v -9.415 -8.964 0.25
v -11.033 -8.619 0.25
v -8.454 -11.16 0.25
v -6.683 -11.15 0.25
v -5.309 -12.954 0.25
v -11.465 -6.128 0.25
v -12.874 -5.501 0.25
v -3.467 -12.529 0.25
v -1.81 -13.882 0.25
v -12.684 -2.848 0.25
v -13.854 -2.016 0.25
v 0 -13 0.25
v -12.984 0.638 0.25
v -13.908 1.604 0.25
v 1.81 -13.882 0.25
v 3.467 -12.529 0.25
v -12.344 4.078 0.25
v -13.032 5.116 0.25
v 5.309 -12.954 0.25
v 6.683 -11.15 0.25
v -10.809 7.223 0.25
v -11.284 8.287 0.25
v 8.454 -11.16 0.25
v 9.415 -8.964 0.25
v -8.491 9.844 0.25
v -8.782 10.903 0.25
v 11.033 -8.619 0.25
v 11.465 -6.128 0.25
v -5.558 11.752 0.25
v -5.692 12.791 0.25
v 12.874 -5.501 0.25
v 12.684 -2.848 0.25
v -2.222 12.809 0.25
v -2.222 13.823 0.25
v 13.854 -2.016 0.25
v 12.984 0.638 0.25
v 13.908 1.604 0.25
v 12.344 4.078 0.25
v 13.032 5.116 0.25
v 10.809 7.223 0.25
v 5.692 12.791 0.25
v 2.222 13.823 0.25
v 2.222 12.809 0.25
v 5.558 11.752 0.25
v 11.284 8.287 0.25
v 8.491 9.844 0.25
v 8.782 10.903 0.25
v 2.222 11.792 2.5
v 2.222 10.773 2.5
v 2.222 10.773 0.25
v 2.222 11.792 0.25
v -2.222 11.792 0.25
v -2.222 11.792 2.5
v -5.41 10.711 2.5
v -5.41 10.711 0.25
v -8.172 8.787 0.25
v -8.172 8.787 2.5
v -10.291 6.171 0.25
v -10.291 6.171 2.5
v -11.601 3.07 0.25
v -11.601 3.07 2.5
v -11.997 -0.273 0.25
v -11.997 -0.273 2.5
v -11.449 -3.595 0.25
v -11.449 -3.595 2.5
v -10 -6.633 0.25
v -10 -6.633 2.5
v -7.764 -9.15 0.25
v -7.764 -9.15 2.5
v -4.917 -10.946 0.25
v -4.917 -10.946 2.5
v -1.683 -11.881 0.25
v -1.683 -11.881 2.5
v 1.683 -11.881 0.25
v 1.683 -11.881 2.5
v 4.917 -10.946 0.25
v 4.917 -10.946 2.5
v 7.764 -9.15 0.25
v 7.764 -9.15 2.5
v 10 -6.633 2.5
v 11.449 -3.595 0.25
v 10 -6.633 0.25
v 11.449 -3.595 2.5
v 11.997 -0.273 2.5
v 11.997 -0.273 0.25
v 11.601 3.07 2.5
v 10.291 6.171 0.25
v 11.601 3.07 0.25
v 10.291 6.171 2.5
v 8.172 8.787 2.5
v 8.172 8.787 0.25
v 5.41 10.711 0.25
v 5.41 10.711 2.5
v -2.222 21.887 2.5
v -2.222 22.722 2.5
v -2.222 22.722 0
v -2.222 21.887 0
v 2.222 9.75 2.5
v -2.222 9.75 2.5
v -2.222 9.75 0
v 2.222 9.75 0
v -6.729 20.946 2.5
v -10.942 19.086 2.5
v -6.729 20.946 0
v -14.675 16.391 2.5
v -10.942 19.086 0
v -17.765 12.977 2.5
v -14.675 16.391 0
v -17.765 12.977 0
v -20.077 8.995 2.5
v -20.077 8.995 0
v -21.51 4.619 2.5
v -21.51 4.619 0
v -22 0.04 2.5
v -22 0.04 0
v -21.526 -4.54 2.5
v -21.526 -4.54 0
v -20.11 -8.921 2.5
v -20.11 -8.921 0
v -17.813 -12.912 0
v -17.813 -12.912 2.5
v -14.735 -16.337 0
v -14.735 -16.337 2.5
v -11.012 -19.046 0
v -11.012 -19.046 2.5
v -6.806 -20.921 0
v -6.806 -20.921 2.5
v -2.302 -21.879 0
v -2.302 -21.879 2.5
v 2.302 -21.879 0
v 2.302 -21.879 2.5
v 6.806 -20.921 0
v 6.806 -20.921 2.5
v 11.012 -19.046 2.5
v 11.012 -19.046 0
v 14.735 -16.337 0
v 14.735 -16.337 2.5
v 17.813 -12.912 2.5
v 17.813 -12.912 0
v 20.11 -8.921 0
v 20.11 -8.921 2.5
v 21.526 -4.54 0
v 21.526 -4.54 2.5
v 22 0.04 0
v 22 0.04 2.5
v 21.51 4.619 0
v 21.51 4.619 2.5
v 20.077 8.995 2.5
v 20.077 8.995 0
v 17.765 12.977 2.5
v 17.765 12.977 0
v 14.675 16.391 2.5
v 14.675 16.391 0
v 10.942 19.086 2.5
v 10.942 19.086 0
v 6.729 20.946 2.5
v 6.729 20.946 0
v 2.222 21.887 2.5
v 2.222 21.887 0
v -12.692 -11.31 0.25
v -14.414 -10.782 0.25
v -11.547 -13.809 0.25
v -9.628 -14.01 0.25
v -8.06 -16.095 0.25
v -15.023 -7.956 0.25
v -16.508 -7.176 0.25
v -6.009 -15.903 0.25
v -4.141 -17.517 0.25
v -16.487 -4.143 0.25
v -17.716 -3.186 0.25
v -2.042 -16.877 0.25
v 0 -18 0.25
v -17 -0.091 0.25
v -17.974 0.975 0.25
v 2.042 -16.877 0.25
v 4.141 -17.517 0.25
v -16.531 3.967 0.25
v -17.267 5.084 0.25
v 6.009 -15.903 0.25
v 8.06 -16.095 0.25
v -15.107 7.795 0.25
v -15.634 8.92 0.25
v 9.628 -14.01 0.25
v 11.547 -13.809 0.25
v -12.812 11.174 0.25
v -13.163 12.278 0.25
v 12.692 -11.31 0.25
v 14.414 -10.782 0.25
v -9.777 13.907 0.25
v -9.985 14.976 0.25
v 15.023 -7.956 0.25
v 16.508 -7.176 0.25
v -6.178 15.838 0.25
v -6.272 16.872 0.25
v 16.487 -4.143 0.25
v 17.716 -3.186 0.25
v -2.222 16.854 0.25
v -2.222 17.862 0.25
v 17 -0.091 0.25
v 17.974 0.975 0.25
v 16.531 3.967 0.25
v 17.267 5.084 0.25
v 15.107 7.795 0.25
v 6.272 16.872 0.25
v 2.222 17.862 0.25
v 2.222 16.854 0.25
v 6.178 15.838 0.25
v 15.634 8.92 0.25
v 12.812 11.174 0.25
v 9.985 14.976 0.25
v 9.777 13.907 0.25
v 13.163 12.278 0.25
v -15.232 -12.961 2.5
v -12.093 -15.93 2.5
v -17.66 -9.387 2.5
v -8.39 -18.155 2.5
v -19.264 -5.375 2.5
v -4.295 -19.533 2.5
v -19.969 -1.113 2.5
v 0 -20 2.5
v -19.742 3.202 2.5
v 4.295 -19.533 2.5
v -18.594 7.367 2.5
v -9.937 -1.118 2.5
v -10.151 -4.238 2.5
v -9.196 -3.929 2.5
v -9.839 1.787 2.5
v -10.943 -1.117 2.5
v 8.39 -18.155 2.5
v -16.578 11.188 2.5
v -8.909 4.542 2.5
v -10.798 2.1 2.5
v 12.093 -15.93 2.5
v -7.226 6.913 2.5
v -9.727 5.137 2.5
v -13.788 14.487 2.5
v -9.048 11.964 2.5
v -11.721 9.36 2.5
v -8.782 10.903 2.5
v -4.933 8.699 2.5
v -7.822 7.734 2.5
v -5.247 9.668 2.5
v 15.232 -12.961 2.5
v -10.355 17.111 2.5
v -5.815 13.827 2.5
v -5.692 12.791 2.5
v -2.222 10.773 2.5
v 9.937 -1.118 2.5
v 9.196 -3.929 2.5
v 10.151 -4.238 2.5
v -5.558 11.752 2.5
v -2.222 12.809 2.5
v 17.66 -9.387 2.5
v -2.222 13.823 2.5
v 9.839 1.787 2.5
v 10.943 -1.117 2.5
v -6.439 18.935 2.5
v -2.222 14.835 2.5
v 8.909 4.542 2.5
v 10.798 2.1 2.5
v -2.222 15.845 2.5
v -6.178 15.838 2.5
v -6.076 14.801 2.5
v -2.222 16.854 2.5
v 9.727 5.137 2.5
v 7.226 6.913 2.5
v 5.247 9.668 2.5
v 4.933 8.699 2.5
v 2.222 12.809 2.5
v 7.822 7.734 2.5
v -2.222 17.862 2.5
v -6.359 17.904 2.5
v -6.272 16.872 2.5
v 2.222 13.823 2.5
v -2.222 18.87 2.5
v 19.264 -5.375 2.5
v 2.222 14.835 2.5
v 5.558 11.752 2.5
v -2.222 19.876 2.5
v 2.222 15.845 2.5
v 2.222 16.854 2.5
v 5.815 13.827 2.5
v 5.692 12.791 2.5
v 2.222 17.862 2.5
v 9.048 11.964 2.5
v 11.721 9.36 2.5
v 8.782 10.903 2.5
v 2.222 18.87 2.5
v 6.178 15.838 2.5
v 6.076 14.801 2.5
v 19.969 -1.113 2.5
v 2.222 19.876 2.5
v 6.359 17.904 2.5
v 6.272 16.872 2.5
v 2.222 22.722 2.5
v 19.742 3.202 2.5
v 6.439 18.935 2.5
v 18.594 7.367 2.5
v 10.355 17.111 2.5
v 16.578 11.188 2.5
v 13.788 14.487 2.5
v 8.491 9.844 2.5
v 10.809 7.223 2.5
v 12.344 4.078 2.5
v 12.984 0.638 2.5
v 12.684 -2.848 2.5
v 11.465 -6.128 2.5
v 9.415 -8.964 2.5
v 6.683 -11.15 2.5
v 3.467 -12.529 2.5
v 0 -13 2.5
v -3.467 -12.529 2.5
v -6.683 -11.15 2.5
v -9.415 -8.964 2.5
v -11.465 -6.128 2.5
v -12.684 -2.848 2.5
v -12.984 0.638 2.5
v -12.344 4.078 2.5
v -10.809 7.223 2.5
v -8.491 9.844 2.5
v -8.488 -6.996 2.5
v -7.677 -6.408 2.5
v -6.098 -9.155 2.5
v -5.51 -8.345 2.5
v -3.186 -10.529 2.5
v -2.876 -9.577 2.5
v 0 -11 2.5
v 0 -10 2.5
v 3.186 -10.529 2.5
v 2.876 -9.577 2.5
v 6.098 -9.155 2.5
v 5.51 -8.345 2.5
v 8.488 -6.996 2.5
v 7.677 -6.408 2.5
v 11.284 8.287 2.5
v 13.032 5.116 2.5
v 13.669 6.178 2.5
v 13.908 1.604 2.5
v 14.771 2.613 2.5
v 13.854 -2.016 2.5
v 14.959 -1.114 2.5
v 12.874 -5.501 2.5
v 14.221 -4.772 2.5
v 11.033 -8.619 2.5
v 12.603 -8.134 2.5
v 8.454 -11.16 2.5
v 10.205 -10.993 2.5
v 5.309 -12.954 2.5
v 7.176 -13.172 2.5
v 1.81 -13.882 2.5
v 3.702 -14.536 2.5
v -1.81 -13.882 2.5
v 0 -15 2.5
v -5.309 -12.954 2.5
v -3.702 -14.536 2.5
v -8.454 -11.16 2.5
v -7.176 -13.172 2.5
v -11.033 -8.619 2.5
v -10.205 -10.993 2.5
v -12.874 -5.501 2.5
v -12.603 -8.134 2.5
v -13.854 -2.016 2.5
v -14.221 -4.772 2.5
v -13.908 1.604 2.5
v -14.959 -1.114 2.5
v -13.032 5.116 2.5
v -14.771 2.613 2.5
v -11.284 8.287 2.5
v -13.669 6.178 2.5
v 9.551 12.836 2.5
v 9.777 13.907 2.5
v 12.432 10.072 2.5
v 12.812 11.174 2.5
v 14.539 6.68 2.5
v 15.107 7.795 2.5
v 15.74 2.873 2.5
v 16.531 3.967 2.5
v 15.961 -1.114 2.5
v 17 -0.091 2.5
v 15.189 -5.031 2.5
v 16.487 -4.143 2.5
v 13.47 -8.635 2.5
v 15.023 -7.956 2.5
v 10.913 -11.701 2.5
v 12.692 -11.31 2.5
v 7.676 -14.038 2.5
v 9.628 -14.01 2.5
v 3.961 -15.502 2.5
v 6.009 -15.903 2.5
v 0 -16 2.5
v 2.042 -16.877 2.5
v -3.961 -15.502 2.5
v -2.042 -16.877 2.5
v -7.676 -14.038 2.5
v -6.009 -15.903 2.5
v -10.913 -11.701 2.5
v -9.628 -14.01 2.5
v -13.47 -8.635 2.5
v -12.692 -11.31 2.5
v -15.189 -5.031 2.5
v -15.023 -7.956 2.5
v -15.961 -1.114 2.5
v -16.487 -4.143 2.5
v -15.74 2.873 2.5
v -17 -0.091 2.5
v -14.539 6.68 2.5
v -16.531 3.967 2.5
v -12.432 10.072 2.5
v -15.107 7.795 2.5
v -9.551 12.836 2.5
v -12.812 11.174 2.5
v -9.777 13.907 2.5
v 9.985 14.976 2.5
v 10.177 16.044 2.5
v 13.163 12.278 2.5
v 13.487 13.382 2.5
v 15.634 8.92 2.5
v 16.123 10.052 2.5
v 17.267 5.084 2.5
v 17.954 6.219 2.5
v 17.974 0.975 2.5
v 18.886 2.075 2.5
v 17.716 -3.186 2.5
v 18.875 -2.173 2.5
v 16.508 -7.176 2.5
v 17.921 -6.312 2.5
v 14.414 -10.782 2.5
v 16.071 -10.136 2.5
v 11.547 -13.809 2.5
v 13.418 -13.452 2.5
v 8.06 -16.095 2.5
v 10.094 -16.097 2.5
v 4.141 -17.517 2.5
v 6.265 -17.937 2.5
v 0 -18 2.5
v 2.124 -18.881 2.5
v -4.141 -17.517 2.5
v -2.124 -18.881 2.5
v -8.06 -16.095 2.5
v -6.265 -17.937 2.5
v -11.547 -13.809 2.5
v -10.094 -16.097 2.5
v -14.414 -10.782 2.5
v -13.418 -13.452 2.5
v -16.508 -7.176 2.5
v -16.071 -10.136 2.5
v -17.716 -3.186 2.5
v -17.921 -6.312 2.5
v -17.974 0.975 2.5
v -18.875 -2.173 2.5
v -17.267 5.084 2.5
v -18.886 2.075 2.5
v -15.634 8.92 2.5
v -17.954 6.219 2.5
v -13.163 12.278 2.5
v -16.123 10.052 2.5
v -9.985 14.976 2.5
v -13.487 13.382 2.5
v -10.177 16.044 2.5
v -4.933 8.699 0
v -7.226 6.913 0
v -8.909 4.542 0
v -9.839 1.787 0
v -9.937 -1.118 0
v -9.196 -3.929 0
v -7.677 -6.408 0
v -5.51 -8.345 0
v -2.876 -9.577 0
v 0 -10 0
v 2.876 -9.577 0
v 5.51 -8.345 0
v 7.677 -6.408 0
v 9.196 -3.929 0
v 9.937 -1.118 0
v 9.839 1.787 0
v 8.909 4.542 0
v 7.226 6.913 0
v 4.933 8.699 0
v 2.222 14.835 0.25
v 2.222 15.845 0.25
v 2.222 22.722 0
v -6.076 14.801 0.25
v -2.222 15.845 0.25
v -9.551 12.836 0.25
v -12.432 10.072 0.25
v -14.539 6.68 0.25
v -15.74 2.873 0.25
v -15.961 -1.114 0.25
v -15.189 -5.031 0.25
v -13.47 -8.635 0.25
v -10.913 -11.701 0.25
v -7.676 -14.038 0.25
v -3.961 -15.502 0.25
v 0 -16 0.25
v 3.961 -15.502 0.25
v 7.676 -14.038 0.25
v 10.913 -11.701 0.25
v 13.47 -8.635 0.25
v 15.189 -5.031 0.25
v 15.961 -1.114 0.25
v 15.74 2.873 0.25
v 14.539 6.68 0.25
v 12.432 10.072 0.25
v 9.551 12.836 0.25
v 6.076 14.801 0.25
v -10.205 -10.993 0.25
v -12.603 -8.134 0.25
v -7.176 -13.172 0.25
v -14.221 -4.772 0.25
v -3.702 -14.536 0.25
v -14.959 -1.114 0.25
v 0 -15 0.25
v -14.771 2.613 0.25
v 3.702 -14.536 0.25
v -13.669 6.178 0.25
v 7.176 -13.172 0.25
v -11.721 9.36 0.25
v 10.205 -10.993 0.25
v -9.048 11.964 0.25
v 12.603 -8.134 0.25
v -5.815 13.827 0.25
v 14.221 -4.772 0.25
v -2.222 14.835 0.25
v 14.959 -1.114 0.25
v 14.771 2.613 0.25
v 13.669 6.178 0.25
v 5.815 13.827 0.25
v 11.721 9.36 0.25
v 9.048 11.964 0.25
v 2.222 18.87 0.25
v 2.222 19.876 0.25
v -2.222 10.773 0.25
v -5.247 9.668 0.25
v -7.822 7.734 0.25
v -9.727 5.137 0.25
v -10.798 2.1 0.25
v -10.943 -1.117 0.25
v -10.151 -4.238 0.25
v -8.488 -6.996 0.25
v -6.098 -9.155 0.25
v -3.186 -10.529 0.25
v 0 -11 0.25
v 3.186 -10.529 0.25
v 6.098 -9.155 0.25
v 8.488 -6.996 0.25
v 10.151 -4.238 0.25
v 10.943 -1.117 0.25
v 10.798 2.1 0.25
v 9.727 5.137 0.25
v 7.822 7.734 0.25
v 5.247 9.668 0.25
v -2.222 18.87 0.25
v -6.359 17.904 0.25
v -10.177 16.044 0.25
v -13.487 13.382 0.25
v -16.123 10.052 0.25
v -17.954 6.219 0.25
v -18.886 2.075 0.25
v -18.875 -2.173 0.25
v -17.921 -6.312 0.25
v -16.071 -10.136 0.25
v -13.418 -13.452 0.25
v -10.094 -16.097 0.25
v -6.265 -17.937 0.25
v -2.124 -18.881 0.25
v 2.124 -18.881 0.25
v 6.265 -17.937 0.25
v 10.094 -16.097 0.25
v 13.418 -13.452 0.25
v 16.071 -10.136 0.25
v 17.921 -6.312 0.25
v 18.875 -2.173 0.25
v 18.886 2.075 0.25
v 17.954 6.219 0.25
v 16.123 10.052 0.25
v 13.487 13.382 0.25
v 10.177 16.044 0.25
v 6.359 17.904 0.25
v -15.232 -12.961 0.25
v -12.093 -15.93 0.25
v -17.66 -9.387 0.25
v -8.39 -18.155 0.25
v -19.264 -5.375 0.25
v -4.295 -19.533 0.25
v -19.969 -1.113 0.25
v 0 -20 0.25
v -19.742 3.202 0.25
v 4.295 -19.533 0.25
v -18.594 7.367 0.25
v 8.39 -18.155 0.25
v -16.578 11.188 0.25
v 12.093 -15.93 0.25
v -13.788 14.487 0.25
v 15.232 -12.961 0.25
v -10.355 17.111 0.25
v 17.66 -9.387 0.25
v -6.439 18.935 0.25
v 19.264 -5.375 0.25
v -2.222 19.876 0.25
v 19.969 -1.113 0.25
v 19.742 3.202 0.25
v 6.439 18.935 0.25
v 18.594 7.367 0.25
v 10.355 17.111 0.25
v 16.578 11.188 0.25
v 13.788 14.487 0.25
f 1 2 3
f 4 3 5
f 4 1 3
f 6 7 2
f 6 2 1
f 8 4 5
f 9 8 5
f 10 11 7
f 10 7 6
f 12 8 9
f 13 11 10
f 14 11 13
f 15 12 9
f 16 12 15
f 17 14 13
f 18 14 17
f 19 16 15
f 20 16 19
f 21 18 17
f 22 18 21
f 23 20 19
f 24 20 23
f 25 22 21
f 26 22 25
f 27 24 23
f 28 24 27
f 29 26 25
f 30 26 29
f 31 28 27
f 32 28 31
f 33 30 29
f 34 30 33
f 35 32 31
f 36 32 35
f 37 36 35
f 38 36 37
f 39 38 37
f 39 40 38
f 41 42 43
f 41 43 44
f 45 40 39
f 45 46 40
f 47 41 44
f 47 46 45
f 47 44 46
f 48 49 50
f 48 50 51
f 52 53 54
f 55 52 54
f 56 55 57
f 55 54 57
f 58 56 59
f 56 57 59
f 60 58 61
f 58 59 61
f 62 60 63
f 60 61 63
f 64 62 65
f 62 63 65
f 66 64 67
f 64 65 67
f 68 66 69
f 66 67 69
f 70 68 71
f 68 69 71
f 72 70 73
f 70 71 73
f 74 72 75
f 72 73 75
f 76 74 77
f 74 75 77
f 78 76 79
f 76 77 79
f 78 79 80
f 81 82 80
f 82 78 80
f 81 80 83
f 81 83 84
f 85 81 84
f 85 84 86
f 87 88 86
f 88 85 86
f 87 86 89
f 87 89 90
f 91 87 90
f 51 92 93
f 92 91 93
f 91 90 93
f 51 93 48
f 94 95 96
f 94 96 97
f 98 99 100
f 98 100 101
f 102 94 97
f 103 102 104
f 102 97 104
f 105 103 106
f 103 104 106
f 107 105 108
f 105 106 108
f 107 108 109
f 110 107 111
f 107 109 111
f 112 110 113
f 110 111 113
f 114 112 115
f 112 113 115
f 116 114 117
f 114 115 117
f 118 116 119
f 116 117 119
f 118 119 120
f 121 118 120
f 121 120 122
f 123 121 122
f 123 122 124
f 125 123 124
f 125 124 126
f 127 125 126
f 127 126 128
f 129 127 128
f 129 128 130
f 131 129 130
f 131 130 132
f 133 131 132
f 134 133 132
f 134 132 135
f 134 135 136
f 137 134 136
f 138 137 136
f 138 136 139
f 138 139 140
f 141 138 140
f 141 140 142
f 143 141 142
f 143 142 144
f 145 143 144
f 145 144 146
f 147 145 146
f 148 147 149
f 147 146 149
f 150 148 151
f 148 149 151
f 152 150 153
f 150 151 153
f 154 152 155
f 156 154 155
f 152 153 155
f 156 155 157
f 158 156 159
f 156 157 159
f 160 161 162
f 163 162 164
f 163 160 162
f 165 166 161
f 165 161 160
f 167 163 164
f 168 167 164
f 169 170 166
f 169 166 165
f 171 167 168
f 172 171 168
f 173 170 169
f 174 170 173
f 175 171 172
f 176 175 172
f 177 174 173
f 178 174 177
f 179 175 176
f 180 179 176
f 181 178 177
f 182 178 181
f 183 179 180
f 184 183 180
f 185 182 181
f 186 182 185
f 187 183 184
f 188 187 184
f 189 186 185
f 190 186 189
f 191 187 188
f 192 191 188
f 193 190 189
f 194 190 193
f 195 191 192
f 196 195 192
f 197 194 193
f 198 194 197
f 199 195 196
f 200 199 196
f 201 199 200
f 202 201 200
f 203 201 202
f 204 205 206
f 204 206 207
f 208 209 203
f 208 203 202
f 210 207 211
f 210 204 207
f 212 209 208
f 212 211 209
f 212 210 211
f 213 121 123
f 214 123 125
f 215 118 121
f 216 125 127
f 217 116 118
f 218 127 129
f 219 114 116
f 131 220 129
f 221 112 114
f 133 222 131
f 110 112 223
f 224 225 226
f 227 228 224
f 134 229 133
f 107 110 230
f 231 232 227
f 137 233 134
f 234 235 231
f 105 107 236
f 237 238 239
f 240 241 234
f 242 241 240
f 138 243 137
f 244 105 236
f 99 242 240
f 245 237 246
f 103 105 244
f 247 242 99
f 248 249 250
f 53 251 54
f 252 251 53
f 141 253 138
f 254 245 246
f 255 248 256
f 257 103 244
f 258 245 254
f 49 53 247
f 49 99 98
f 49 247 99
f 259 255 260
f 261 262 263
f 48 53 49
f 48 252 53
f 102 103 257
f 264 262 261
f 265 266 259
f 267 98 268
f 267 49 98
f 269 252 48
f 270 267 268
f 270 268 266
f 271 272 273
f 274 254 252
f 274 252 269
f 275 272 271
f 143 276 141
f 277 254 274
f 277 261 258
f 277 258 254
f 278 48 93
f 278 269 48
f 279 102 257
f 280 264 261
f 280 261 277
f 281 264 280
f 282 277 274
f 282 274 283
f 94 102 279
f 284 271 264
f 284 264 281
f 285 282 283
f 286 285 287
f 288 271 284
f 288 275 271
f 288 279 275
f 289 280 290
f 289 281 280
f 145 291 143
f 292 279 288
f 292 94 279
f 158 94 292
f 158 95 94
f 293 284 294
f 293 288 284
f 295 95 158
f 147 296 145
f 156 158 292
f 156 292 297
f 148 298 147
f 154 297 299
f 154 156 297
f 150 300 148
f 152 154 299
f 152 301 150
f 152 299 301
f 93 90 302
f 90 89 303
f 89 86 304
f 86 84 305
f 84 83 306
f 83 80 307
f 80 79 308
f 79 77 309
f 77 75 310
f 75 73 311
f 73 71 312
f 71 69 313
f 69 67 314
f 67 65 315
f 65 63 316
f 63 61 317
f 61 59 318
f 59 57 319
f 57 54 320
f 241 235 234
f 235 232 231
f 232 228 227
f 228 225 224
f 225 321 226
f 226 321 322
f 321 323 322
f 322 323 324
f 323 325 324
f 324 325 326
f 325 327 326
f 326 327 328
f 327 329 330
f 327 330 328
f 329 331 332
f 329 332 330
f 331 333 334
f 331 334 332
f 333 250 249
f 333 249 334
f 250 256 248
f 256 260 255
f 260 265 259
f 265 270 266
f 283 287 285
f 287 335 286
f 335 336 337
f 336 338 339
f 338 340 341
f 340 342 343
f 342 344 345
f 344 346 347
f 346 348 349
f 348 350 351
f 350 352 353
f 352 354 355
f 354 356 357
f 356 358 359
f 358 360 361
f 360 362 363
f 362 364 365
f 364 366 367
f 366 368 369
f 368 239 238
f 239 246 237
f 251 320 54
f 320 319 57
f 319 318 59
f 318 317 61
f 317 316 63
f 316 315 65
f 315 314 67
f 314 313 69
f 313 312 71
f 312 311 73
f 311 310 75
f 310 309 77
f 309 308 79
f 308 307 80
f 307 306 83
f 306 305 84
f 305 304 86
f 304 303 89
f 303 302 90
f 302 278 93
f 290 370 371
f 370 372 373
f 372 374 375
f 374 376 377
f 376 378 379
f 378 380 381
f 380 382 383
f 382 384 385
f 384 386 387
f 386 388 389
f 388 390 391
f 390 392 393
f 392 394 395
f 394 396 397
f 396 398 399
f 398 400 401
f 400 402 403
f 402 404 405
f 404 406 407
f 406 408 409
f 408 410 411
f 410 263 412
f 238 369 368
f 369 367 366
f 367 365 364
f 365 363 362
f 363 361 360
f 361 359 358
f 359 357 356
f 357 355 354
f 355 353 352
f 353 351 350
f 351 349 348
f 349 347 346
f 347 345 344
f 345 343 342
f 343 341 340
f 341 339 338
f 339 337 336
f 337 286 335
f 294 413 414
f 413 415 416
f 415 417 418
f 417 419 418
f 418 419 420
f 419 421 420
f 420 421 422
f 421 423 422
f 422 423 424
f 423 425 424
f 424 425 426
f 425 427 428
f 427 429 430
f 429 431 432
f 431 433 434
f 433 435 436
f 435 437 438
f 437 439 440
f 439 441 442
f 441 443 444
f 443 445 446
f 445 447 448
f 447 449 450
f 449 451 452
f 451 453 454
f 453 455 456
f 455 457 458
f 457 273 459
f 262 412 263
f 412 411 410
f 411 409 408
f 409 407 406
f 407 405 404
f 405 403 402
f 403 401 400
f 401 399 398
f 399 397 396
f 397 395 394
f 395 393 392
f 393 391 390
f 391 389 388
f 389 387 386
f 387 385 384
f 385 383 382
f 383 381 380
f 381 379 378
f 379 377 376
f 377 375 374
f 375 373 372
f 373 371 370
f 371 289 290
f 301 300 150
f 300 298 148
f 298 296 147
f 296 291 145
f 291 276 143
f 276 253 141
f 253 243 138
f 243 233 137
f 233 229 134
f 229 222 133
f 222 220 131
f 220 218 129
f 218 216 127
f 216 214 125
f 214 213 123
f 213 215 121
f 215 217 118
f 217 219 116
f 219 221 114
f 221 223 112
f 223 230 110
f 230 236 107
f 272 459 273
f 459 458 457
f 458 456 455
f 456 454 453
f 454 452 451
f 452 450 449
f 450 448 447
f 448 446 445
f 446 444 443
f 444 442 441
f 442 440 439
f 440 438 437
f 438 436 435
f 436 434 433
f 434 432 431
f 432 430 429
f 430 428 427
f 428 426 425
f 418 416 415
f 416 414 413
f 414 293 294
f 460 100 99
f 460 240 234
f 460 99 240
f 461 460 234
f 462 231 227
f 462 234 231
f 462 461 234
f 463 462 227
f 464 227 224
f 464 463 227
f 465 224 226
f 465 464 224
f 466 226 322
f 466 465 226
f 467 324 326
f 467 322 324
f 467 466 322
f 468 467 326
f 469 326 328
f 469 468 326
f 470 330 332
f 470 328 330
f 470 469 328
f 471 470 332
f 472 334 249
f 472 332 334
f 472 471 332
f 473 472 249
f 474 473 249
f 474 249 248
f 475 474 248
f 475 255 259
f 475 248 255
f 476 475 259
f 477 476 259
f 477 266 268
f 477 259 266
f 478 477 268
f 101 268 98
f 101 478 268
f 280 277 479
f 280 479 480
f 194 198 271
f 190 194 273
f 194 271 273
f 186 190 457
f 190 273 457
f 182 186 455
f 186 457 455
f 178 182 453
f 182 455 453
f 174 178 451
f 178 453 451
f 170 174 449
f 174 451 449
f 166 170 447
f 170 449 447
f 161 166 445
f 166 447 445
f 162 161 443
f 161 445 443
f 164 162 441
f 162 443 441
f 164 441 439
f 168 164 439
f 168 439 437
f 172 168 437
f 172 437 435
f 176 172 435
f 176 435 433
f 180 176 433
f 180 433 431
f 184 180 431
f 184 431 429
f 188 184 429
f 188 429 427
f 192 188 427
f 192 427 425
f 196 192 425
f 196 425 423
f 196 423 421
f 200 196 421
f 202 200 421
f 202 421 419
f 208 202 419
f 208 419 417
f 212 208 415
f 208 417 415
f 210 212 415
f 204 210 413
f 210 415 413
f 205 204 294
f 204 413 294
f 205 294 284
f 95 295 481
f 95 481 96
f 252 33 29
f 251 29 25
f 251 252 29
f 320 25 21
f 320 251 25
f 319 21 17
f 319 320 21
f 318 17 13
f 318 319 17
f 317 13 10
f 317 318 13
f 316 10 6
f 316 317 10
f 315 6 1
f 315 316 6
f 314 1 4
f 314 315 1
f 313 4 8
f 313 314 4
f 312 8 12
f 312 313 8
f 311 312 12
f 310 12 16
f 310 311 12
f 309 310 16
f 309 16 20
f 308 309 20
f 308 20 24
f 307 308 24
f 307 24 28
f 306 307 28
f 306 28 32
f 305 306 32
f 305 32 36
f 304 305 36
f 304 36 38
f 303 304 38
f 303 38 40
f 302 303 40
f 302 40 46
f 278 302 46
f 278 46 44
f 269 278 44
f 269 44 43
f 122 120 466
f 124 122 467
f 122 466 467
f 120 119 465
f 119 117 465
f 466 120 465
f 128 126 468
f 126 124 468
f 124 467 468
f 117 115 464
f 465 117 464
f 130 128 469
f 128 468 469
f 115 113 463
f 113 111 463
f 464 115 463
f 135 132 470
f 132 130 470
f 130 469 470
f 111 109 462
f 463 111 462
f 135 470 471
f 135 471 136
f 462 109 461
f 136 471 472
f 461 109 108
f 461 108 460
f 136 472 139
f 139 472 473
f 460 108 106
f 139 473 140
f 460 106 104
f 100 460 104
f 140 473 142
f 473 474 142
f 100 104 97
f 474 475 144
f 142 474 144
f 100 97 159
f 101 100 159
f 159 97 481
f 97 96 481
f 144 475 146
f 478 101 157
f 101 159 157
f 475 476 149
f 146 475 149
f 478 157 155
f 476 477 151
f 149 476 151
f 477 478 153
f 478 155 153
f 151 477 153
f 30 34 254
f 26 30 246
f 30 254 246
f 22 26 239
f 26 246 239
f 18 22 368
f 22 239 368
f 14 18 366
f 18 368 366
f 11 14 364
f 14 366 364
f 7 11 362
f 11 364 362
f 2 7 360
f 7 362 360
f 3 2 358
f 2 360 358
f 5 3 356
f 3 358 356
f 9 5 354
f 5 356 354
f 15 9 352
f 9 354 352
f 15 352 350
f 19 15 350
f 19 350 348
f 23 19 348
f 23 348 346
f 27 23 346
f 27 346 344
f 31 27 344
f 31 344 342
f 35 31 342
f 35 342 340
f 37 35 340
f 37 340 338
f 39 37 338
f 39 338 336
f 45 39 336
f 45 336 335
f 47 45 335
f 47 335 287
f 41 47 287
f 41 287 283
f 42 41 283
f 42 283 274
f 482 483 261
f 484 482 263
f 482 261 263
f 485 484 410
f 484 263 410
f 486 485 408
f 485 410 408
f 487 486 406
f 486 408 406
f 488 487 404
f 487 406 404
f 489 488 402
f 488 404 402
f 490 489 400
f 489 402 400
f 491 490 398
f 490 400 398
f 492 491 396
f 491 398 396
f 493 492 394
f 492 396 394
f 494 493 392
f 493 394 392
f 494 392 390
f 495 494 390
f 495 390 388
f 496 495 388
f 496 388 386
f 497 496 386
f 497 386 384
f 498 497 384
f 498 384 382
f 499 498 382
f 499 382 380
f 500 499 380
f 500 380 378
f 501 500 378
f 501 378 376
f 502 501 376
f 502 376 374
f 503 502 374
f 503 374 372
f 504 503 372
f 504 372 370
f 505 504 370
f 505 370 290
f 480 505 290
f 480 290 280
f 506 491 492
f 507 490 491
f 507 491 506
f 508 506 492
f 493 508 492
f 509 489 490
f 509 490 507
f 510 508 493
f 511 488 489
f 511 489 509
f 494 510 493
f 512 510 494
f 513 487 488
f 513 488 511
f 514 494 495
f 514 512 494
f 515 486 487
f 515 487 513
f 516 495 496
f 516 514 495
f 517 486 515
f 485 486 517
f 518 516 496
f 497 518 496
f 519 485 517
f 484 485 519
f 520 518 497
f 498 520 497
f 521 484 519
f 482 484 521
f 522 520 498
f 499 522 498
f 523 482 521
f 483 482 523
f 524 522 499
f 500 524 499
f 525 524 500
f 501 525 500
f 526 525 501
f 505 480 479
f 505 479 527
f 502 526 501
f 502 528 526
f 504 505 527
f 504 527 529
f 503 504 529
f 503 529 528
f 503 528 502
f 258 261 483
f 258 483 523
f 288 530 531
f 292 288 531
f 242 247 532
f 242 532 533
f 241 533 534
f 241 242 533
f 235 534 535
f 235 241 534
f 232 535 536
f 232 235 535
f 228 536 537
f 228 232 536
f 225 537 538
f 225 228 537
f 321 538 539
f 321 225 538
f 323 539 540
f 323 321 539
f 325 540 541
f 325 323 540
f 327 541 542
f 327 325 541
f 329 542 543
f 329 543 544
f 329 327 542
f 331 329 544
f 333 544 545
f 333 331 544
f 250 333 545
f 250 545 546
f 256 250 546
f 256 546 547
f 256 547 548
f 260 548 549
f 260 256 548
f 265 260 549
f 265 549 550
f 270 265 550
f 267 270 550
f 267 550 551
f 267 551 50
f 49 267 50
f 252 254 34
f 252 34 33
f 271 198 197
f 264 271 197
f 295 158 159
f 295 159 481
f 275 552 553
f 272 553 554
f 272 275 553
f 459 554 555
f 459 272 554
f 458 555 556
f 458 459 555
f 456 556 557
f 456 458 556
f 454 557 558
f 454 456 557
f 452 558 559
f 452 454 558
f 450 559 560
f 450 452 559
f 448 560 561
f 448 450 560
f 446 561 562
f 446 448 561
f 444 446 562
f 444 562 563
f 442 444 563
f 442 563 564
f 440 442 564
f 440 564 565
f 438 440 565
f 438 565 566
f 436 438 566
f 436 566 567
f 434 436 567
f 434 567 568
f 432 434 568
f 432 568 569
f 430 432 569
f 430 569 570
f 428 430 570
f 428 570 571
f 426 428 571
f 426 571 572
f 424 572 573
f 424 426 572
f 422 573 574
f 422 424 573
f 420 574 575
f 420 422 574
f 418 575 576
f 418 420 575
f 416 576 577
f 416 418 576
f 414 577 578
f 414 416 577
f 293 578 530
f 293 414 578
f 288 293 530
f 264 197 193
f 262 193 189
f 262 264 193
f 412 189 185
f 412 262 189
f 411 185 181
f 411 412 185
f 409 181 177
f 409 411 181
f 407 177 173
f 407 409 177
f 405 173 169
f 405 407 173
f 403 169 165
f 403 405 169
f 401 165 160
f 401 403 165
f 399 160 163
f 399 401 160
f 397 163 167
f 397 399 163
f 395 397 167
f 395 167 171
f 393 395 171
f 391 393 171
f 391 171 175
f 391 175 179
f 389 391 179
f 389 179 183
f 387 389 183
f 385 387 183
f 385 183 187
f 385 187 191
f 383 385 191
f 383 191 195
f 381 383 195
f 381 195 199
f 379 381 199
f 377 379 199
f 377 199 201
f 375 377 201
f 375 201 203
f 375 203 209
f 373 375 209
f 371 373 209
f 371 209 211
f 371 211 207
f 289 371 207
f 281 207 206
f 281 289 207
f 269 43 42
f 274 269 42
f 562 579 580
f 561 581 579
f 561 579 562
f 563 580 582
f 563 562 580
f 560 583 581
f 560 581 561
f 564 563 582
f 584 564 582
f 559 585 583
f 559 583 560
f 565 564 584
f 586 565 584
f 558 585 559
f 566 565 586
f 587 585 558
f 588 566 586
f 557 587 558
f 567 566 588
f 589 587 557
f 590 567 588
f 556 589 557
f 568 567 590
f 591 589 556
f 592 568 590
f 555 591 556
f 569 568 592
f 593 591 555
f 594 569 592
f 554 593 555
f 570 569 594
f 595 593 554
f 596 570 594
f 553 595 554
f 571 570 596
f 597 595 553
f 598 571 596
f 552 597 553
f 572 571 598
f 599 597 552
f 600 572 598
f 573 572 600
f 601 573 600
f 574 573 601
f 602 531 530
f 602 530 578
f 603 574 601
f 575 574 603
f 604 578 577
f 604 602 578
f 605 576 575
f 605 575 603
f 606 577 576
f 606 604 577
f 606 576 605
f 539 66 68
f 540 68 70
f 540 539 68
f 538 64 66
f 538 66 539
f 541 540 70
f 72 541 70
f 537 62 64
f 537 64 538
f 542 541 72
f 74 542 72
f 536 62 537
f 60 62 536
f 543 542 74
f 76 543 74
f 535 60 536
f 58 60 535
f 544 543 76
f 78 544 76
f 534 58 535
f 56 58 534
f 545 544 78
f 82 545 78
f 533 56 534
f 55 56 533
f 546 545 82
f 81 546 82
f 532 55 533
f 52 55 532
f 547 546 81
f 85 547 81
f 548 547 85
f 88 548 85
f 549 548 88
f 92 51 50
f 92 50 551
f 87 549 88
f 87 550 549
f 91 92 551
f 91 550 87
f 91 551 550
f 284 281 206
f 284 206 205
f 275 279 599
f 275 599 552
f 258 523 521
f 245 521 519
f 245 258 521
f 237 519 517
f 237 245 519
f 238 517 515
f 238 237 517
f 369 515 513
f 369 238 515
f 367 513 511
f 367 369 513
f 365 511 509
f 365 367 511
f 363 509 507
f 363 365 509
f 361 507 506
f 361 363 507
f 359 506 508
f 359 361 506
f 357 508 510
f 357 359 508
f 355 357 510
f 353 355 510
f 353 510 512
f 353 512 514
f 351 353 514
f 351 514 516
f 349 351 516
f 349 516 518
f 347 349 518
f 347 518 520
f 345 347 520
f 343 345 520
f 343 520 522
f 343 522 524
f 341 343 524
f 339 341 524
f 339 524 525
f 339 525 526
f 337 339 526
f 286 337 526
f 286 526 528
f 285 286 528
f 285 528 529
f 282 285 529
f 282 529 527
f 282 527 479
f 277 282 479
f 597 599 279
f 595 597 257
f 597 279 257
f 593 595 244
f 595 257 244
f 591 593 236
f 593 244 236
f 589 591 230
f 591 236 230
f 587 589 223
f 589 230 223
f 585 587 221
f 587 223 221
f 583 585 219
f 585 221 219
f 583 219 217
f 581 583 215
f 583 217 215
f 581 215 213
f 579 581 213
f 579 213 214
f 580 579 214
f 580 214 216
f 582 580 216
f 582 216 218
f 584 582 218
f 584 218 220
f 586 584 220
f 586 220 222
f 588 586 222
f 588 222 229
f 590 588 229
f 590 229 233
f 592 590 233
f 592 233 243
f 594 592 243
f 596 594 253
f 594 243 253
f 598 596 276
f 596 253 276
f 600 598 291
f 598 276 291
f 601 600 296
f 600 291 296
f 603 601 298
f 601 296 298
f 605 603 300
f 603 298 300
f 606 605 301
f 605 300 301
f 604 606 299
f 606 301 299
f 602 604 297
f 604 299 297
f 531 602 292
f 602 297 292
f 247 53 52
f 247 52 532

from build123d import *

# Parameters (mm, degrees)
CROQUIS1_R              = 22
CROQUIS1_R_2            = 10
SALIENTE_EXTRUIR1_DEPTH = 2.5
CROQUIS2_R              = 20
CROQUIS2_R_2            = 19
CROQUIS2_R_3            = 18
CROQUIS2_R_4            = 17
CROQUIS2_R_5            = 16
CROQUIS2_R_6            = 15
CROQUIS2_R_7            = 14
CROQUIS2_R_8            = 13
CROQUIS2_R_9            = 12
CROQUIS2_R_10           = 11
CORTAR_EXTRUIR1_DEPTH   = 2.25
SALIENTE_EXTRUIR2_DEPTH = 2.5


with BuildPart() as part:
    # Croquis1 → Saliente-Extruir1 (new body)
    with BuildSketch(Plane.XY):
        Circle(CROQUIS1_R)
        Circle(CROQUIS1_R_2, mode=Mode.SUBTRACT)
    extrude(amount=SALIENTE_EXTRUIR1_DEPTH)

    # Croquis2 → Cortar-Extruir1 (cut)
    # profile 1 of 5: a face of its own
    with BuildSketch(Plane.XY.offset(2.5)):
        Circle(CROQUIS2_R)
        Circle(CROQUIS2_R_2, mode=Mode.SUBTRACT)
    # profile 2 of 5: a face of its own
    with BuildSketch(Plane.XY.offset(2.5)):
        Circle(CROQUIS2_R_3)
        Circle(CROQUIS2_R_4, mode=Mode.SUBTRACT)
    # profile 3 of 5: a face of its own
    with BuildSketch(Plane.XY.offset(2.5)):
        Circle(CROQUIS2_R_5)
        Circle(CROQUIS2_R_6, mode=Mode.SUBTRACT)
    # profile 4 of 5: a face of its own
    with BuildSketch(Plane.XY.offset(2.5)):
        Circle(CROQUIS2_R_7)
        Circle(CROQUIS2_R_8, mode=Mode.SUBTRACT)
    # profile 5 of 5: a face of its own
    with BuildSketch(Plane.XY.offset(2.5)):
        Circle(CROQUIS2_R_9)
        Circle(CROQUIS2_R_10, mode=Mode.SUBTRACT)
    extrude(amount=-CORTAR_EXTRUIR1_DEPTH, mode=Mode.SUBTRACT)

    # Croquis3 → Saliente-Extruir2 (add)
    with BuildSketch(Plane.XY.offset(2.5)):
        with BuildLine():
            ThreePointArc((2.222048604, 9.75), (0, 10), (-2.222048604, 9.75))
            Line((-2.222048604, 9.75), (2.222048604, 9.75))
        make_face()
        with BuildLine():
            ThreePointArc((-2.222048604, 10.773230713), (0, 11), (2.222048604, 10.773230713))
            Line((2.222048604, 10.773230713), (2.222048604, 11.792476415))
            ThreePointArc((2.222048604, 11.792476415), (0, 12), (-2.222048604, 11.792476415))
            Line((-2.222048604, 11.792476415), (-2.222048604, 10.773230713))
        make_face()
        with BuildLine():
            ThreePointArc((-2.222048604, 12.808688457), (0, 13), (2.222048604, 12.808688457))
            Line((2.222048604, 12.808688457), (2.222048604, 13.822535947))
            ThreePointArc((2.222048604, 13.822535947), (0, 14), (-2.222048604, 13.822535947))
            Line((-2.222048604, 13.822535947), (-2.222048604, 12.808688457))
        make_face()
        with BuildLine():
            ThreePointArc((-2.222048604, 14.834503699), (0, 15), (2.222048604, 14.834503699))
            Line((2.222048604, 14.834503699), (2.222048604, 15.844951877))
            ThreePointArc((2.222048604, 15.844951877), (0, 16), (-2.222048604, 15.844951877))
            Line((-2.222048604, 15.844951877), (-2.222048604, 14.834503699))
        make_face()
        with BuildLine():
            ThreePointArc((-2.222048604, 16.854153791), (0, 17), (2.222048604, 16.854153791))
            Line((2.222048604, 16.854153791), (2.222048604, 17.862320678))
            ThreePointArc((2.222048604, 17.862320678), (0, 18), (-2.222048604, 17.862320678))
            Line((-2.222048604, 17.862320678), (-2.222048604, 16.854153791))
        make_face()
        with BuildLine():
            ThreePointArc((-2.222048604, 18.869618438), (0, 19), (2.222048604, 18.869618438))
            Line((2.222048604, 18.869618438), (2.222048604, 19.87617921))
            ThreePointArc((2.222048604, 19.87617921), (0, 20), (-2.222048604, 19.87617921))
            Line((-2.222048604, 19.87617921), (-2.222048604, 18.869618438))
        make_face()
        with BuildLine():
            ThreePointArc((-2.222048604, 21.887496431), (0, 22), (2.222048604, 21.887496431))
            Line((2.222048604, 21.887496431), (2.222048604, 22.721977181))
            Line((2.222048604, 22.721977181), (-2.222048604, 22.721977181))
            Line((-2.222048604, 22.721977181), (-2.222048604, 21.887496431))
        make_face()
    extrude(amount=-SALIENTE_EXTRUIR2_DEPTH)


solid = part.part
